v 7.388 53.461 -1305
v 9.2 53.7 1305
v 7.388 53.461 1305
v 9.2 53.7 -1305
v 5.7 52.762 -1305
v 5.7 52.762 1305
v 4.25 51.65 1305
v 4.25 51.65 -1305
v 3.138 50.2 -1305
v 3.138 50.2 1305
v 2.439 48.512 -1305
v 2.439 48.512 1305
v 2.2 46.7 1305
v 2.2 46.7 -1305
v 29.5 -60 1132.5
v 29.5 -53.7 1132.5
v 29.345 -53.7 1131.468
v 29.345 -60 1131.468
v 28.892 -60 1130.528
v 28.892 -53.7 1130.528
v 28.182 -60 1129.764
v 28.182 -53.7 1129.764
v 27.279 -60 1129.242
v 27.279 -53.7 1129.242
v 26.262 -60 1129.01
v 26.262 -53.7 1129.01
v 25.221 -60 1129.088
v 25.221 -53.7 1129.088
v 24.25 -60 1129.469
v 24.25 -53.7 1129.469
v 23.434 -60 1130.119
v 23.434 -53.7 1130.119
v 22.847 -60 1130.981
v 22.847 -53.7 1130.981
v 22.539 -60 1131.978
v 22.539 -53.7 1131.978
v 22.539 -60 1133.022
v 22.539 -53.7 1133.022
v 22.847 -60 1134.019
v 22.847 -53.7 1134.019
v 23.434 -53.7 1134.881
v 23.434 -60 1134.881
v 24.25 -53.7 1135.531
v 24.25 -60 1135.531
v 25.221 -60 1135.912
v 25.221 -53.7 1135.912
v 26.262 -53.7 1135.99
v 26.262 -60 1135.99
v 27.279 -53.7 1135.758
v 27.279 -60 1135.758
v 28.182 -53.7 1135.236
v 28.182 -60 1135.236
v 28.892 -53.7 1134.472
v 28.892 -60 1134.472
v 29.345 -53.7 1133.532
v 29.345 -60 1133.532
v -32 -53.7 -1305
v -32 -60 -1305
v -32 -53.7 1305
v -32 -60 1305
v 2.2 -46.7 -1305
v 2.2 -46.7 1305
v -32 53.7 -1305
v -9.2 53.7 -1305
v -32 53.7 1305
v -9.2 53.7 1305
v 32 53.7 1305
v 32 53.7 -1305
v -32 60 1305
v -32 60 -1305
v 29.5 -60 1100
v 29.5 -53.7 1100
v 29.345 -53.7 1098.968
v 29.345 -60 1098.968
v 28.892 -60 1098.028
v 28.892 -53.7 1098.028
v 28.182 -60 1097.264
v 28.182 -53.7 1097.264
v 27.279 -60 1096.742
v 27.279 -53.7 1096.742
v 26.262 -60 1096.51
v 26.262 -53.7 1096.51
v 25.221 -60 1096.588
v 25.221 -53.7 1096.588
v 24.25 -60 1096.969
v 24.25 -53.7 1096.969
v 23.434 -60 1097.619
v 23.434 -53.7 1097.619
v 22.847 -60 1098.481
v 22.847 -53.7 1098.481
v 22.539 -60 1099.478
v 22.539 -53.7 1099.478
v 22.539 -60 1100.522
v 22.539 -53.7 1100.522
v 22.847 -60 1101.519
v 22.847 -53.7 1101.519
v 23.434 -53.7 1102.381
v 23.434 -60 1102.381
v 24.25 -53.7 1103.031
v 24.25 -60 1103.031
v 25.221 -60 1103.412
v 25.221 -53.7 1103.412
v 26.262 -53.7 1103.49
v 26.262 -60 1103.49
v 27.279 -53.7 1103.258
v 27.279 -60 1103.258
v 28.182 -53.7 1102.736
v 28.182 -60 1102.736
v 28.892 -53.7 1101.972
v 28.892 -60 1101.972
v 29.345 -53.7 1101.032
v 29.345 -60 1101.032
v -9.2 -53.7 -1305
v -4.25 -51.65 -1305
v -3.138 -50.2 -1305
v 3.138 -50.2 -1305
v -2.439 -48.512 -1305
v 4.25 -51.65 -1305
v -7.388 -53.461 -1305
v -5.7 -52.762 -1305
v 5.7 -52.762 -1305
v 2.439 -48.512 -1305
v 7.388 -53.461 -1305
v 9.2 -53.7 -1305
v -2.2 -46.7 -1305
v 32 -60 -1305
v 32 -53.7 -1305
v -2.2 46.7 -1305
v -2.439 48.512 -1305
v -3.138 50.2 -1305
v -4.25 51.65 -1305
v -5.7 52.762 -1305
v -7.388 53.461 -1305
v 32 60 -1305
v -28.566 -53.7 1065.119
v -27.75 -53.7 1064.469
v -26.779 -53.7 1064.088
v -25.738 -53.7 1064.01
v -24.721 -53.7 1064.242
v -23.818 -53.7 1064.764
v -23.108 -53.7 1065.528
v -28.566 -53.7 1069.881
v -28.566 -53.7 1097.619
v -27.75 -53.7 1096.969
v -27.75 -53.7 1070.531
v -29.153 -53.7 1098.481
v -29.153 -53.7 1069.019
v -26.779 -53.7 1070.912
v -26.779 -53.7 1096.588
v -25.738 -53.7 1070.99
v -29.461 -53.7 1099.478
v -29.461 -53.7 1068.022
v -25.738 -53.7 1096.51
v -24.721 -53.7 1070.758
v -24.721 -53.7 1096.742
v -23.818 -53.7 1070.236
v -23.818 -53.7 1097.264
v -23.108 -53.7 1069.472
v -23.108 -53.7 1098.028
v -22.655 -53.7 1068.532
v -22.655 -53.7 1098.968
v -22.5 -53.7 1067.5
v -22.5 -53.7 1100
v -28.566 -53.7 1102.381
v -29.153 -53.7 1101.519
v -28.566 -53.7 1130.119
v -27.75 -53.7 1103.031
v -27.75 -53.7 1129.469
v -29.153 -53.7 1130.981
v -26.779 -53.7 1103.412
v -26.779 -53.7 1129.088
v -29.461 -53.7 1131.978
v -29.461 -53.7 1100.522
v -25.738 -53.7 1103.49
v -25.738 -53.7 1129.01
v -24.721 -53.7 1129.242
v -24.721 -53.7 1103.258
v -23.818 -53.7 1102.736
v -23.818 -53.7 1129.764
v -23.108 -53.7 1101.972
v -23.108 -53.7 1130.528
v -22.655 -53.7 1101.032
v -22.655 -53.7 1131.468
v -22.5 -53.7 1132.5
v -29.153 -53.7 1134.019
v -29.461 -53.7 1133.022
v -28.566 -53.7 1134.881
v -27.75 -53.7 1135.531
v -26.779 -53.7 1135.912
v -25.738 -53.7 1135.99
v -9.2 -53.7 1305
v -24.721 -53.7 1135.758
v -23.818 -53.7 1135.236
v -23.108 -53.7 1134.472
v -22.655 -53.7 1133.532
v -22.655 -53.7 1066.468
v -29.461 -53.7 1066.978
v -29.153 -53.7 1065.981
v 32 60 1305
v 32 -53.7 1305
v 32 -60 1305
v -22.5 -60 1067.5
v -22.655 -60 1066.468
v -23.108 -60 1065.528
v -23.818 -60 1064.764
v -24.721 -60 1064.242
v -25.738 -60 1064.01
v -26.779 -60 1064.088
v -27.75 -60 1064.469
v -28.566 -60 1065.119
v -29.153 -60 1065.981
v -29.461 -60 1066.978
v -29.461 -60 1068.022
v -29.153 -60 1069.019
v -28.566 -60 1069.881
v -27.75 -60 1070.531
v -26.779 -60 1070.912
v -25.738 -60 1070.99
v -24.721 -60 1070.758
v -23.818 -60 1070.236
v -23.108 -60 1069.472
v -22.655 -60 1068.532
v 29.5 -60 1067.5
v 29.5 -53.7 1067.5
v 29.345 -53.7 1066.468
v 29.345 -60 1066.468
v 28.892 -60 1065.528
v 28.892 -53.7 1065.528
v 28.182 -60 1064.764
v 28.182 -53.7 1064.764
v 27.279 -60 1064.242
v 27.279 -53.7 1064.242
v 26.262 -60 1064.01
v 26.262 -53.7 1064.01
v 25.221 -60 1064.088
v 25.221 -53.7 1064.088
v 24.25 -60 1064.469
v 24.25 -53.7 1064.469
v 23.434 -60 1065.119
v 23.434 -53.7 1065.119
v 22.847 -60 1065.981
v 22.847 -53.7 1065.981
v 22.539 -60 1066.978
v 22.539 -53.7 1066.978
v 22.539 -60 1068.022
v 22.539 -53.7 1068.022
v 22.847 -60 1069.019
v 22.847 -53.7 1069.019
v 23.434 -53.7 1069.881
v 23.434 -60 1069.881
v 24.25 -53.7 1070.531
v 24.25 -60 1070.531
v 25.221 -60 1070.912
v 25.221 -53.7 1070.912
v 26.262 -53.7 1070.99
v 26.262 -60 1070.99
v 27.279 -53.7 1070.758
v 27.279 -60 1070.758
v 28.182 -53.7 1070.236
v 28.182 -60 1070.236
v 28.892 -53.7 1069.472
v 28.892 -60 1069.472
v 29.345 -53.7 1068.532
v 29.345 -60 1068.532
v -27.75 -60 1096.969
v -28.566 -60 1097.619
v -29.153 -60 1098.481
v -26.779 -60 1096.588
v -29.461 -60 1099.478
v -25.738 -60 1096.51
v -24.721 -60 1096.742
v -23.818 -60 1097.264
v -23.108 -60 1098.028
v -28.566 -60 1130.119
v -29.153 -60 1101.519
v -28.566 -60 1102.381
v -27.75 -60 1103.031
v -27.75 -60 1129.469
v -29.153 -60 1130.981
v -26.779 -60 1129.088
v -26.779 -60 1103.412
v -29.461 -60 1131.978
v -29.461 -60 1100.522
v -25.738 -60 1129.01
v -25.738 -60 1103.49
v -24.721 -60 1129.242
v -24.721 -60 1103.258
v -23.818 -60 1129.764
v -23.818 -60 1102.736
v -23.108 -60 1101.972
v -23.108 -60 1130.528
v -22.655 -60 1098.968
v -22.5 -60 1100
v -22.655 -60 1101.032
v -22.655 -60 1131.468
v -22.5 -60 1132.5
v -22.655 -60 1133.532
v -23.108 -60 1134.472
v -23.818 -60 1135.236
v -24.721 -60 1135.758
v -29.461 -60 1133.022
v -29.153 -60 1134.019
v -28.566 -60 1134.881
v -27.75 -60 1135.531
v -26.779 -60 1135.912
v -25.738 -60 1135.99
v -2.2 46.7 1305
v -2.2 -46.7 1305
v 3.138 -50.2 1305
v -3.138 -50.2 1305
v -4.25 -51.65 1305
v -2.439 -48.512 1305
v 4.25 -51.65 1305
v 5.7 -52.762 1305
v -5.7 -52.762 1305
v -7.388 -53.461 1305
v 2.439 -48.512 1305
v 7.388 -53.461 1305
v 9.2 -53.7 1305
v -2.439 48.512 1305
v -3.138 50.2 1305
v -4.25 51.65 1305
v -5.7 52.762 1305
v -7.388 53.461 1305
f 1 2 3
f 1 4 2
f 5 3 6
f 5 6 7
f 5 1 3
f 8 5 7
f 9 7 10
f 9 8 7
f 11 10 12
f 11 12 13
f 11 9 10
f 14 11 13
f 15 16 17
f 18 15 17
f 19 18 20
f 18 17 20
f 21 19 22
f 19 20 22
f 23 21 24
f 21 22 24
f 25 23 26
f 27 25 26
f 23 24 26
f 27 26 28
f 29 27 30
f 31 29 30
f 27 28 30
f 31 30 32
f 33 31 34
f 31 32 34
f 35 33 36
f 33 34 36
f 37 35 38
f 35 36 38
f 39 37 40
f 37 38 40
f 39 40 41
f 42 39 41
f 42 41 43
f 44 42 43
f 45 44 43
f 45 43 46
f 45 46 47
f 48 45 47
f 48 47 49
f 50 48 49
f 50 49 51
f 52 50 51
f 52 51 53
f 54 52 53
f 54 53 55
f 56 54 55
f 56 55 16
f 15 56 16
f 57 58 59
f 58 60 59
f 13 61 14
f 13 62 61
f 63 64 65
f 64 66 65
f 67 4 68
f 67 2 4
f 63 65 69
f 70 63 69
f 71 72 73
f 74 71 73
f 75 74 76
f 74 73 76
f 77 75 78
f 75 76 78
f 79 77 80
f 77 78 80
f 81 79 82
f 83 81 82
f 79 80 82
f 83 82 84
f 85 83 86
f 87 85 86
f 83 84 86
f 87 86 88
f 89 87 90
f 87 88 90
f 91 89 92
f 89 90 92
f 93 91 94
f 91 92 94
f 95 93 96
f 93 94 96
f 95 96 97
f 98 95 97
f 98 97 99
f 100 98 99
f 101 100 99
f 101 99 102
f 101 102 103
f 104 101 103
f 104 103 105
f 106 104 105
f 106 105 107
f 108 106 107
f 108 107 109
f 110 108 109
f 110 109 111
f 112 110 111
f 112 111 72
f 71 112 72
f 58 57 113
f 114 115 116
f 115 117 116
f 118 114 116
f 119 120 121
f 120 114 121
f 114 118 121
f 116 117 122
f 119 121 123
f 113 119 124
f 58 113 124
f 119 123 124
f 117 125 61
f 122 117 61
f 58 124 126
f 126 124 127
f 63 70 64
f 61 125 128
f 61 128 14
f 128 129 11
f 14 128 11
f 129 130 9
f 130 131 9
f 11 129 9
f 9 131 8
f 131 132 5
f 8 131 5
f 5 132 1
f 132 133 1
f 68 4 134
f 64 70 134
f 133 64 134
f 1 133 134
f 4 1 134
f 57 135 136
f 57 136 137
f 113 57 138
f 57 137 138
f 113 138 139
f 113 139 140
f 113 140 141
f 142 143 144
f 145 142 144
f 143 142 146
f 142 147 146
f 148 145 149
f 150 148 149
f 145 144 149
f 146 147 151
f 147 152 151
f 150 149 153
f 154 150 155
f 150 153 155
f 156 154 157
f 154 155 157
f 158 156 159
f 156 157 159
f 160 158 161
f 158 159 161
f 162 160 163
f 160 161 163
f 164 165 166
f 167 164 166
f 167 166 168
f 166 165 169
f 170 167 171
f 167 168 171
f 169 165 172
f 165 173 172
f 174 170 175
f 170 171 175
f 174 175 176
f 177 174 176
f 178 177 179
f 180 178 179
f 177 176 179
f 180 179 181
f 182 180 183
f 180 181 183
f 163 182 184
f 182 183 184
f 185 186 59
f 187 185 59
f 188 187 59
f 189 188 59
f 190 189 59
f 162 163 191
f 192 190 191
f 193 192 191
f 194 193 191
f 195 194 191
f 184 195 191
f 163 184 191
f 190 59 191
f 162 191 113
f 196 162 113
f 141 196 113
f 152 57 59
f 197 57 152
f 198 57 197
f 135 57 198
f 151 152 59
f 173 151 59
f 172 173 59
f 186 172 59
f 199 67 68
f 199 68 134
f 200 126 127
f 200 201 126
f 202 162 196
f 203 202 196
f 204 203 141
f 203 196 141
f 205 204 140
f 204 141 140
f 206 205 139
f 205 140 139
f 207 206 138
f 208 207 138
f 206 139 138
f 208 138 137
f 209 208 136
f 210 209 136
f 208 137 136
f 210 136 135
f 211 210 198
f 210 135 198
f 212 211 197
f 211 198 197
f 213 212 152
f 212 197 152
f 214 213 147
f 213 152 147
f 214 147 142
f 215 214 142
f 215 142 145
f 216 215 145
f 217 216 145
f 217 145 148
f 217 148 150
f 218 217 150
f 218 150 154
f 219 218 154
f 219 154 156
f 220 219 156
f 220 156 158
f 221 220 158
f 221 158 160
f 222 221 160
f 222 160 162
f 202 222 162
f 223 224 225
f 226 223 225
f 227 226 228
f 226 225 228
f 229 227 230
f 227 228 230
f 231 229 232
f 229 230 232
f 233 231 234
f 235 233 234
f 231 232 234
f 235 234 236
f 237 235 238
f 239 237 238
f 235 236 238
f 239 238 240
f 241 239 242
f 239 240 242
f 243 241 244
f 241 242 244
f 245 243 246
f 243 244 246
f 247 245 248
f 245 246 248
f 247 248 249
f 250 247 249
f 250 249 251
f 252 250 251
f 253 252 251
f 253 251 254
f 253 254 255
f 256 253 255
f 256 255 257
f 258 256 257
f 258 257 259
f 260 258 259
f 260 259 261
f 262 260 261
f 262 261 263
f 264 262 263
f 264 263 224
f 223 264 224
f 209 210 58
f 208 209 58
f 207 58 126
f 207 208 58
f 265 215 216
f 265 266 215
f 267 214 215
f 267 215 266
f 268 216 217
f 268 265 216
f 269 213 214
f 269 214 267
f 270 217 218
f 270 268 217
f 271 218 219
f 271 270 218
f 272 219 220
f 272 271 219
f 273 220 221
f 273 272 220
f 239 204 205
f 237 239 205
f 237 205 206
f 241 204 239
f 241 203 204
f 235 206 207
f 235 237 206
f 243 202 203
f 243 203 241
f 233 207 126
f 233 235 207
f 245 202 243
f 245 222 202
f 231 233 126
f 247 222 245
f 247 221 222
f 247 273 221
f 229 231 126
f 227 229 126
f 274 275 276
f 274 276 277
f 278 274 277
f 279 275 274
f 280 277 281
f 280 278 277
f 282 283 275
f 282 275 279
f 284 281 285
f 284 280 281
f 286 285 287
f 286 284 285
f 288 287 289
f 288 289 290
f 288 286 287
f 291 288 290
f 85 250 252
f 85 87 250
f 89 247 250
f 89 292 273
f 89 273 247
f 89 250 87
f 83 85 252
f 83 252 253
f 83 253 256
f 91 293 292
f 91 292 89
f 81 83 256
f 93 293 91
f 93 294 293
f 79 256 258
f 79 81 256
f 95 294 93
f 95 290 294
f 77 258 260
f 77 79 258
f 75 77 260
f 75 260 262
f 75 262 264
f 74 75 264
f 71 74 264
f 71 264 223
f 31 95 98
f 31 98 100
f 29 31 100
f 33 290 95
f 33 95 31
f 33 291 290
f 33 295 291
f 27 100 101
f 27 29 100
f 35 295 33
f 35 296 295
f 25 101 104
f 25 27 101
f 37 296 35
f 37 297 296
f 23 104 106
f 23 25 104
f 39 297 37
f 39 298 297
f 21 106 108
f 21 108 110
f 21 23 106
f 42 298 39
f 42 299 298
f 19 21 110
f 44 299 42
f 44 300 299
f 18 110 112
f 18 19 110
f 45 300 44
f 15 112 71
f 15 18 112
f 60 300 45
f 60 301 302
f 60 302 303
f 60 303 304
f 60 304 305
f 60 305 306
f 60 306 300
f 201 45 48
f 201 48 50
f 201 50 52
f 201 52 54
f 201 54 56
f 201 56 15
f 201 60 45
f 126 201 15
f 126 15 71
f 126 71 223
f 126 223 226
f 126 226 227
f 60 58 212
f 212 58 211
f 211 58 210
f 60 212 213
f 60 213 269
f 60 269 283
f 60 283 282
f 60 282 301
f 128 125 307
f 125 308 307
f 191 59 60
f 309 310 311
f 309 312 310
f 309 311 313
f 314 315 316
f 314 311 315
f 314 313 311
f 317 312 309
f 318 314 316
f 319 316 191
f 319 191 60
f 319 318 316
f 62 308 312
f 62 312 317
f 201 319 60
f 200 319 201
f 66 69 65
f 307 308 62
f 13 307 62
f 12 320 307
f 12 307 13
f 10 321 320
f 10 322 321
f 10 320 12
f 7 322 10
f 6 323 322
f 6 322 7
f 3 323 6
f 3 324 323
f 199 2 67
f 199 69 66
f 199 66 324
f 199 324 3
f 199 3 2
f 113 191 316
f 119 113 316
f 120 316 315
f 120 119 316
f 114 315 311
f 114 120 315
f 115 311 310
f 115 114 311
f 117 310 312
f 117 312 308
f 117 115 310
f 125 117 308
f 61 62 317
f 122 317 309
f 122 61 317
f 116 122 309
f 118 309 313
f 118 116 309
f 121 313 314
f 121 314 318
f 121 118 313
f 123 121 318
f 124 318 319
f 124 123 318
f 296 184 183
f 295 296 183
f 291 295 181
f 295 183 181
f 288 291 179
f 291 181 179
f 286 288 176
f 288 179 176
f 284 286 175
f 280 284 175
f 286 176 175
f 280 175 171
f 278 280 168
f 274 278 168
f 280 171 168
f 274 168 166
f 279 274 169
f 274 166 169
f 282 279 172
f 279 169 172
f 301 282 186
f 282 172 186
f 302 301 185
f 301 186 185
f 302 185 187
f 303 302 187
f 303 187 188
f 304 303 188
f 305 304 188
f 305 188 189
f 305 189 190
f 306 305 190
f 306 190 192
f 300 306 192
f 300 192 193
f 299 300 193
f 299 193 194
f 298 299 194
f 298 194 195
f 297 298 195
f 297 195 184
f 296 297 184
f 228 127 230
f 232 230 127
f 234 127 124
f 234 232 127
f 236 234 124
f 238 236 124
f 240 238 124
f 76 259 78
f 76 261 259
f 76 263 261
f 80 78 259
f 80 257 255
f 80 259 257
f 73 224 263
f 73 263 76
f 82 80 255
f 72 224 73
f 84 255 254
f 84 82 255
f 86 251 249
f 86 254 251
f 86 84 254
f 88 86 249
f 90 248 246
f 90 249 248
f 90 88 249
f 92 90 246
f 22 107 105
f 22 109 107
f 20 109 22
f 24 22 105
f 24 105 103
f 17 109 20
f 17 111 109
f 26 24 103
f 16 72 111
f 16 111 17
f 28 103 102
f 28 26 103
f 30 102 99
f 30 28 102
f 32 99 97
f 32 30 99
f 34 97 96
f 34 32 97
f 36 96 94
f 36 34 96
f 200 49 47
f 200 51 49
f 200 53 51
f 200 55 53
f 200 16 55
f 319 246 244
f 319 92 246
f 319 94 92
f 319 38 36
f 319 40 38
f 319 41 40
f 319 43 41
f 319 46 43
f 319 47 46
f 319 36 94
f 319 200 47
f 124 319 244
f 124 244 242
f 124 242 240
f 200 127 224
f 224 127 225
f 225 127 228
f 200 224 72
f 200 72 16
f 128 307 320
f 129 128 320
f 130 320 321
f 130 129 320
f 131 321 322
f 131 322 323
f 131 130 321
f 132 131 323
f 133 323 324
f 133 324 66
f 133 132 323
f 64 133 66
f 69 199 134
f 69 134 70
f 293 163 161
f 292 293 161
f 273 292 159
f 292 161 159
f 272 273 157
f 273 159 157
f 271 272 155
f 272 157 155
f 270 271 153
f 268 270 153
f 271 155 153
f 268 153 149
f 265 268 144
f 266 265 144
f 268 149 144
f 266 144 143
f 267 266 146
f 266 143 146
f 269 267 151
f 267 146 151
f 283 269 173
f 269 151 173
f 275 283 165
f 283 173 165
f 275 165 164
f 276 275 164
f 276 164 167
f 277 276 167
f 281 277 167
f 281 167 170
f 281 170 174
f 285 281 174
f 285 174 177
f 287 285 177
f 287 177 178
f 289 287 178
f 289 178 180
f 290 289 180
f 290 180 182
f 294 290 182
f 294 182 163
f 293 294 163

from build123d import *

# Parameters (mm, degrees)
BOSS_EXTRUDE1_DEPTH          = 1305
FILLET1_R                    = 7
F_7_0_7_DIAMETER_HOLE1_D     = 7
F_7_0_7_DIAMETER_HOLE1_DEPTH = 6.3
LPATTERN1_COUNT              = 3
LPATTERN1_PITCH              = 32.5
LPATTERN1_COUNT_DIR2         = 2
LPATTERN1_PITCH_DIR2         = 52


with BuildPart() as part:
    # Sketch1 → Boss-Extrude1 (new body, symmetric)
    with BuildSketch(Plane.XY):
        Polygon((0, 60), (0, -60), (-32, -60), (-32, -53.7), (-2.2, -53.7), (-2.2, 53.7), (-32, 53.7), (-32, 60), align=None)
    boss_extrude1 = extrude(amount=BOSS_EXTRUDE1_DEPTH, both=True)

    # Mirror1: Boss-Extrude1 across plane
    add(boss_extrude1.mirror(Plane(origin=(0, 60, 1305), x_dir=(0, 0, 1), z_dir=(-1, 0, 0))))

    # Fillet1
    fillet1_edges = [part.edges().sort_by_distance(p)[0] for p in [
        (-2.2, -53.7, 0),
        (-2.2, 53.7, 0),
        (2.2, -53.7, 0),
        (2.2, 53.7, 0),
    ]]
    fillet(fillet1_edges, radius=FILLET1_R)

    # Ø7.0 (7) Diameter Hole1
    with Locations(Plane(origin=(0, -60, 0), x_dir=(-1, 0, 0), z_dir=(0, -1, 0))):
        with Locations((-26, -1132.5)):
            f_7_0_7_diameter_hole1 = Hole(F_7_0_7_DIAMETER_HOLE1_D / 2, depth=F_7_0_7_DIAMETER_HOLE1_DEPTH)

    # LPattern1: 7.0 _7_ Diameter Hole1 3 × 2
    with Locations(*[(-j * LPATTERN1_PITCH_DIR2, 0, -i * LPATTERN1_PITCH) for i in range(LPATTERN1_COUNT) for j in range(LPATTERN1_COUNT_DIR2) if (i, j) != (0, 0)]):
        add(f_7_0_7_diameter_hole1, mode=Mode.SUBTRACT)


solid = part.part
